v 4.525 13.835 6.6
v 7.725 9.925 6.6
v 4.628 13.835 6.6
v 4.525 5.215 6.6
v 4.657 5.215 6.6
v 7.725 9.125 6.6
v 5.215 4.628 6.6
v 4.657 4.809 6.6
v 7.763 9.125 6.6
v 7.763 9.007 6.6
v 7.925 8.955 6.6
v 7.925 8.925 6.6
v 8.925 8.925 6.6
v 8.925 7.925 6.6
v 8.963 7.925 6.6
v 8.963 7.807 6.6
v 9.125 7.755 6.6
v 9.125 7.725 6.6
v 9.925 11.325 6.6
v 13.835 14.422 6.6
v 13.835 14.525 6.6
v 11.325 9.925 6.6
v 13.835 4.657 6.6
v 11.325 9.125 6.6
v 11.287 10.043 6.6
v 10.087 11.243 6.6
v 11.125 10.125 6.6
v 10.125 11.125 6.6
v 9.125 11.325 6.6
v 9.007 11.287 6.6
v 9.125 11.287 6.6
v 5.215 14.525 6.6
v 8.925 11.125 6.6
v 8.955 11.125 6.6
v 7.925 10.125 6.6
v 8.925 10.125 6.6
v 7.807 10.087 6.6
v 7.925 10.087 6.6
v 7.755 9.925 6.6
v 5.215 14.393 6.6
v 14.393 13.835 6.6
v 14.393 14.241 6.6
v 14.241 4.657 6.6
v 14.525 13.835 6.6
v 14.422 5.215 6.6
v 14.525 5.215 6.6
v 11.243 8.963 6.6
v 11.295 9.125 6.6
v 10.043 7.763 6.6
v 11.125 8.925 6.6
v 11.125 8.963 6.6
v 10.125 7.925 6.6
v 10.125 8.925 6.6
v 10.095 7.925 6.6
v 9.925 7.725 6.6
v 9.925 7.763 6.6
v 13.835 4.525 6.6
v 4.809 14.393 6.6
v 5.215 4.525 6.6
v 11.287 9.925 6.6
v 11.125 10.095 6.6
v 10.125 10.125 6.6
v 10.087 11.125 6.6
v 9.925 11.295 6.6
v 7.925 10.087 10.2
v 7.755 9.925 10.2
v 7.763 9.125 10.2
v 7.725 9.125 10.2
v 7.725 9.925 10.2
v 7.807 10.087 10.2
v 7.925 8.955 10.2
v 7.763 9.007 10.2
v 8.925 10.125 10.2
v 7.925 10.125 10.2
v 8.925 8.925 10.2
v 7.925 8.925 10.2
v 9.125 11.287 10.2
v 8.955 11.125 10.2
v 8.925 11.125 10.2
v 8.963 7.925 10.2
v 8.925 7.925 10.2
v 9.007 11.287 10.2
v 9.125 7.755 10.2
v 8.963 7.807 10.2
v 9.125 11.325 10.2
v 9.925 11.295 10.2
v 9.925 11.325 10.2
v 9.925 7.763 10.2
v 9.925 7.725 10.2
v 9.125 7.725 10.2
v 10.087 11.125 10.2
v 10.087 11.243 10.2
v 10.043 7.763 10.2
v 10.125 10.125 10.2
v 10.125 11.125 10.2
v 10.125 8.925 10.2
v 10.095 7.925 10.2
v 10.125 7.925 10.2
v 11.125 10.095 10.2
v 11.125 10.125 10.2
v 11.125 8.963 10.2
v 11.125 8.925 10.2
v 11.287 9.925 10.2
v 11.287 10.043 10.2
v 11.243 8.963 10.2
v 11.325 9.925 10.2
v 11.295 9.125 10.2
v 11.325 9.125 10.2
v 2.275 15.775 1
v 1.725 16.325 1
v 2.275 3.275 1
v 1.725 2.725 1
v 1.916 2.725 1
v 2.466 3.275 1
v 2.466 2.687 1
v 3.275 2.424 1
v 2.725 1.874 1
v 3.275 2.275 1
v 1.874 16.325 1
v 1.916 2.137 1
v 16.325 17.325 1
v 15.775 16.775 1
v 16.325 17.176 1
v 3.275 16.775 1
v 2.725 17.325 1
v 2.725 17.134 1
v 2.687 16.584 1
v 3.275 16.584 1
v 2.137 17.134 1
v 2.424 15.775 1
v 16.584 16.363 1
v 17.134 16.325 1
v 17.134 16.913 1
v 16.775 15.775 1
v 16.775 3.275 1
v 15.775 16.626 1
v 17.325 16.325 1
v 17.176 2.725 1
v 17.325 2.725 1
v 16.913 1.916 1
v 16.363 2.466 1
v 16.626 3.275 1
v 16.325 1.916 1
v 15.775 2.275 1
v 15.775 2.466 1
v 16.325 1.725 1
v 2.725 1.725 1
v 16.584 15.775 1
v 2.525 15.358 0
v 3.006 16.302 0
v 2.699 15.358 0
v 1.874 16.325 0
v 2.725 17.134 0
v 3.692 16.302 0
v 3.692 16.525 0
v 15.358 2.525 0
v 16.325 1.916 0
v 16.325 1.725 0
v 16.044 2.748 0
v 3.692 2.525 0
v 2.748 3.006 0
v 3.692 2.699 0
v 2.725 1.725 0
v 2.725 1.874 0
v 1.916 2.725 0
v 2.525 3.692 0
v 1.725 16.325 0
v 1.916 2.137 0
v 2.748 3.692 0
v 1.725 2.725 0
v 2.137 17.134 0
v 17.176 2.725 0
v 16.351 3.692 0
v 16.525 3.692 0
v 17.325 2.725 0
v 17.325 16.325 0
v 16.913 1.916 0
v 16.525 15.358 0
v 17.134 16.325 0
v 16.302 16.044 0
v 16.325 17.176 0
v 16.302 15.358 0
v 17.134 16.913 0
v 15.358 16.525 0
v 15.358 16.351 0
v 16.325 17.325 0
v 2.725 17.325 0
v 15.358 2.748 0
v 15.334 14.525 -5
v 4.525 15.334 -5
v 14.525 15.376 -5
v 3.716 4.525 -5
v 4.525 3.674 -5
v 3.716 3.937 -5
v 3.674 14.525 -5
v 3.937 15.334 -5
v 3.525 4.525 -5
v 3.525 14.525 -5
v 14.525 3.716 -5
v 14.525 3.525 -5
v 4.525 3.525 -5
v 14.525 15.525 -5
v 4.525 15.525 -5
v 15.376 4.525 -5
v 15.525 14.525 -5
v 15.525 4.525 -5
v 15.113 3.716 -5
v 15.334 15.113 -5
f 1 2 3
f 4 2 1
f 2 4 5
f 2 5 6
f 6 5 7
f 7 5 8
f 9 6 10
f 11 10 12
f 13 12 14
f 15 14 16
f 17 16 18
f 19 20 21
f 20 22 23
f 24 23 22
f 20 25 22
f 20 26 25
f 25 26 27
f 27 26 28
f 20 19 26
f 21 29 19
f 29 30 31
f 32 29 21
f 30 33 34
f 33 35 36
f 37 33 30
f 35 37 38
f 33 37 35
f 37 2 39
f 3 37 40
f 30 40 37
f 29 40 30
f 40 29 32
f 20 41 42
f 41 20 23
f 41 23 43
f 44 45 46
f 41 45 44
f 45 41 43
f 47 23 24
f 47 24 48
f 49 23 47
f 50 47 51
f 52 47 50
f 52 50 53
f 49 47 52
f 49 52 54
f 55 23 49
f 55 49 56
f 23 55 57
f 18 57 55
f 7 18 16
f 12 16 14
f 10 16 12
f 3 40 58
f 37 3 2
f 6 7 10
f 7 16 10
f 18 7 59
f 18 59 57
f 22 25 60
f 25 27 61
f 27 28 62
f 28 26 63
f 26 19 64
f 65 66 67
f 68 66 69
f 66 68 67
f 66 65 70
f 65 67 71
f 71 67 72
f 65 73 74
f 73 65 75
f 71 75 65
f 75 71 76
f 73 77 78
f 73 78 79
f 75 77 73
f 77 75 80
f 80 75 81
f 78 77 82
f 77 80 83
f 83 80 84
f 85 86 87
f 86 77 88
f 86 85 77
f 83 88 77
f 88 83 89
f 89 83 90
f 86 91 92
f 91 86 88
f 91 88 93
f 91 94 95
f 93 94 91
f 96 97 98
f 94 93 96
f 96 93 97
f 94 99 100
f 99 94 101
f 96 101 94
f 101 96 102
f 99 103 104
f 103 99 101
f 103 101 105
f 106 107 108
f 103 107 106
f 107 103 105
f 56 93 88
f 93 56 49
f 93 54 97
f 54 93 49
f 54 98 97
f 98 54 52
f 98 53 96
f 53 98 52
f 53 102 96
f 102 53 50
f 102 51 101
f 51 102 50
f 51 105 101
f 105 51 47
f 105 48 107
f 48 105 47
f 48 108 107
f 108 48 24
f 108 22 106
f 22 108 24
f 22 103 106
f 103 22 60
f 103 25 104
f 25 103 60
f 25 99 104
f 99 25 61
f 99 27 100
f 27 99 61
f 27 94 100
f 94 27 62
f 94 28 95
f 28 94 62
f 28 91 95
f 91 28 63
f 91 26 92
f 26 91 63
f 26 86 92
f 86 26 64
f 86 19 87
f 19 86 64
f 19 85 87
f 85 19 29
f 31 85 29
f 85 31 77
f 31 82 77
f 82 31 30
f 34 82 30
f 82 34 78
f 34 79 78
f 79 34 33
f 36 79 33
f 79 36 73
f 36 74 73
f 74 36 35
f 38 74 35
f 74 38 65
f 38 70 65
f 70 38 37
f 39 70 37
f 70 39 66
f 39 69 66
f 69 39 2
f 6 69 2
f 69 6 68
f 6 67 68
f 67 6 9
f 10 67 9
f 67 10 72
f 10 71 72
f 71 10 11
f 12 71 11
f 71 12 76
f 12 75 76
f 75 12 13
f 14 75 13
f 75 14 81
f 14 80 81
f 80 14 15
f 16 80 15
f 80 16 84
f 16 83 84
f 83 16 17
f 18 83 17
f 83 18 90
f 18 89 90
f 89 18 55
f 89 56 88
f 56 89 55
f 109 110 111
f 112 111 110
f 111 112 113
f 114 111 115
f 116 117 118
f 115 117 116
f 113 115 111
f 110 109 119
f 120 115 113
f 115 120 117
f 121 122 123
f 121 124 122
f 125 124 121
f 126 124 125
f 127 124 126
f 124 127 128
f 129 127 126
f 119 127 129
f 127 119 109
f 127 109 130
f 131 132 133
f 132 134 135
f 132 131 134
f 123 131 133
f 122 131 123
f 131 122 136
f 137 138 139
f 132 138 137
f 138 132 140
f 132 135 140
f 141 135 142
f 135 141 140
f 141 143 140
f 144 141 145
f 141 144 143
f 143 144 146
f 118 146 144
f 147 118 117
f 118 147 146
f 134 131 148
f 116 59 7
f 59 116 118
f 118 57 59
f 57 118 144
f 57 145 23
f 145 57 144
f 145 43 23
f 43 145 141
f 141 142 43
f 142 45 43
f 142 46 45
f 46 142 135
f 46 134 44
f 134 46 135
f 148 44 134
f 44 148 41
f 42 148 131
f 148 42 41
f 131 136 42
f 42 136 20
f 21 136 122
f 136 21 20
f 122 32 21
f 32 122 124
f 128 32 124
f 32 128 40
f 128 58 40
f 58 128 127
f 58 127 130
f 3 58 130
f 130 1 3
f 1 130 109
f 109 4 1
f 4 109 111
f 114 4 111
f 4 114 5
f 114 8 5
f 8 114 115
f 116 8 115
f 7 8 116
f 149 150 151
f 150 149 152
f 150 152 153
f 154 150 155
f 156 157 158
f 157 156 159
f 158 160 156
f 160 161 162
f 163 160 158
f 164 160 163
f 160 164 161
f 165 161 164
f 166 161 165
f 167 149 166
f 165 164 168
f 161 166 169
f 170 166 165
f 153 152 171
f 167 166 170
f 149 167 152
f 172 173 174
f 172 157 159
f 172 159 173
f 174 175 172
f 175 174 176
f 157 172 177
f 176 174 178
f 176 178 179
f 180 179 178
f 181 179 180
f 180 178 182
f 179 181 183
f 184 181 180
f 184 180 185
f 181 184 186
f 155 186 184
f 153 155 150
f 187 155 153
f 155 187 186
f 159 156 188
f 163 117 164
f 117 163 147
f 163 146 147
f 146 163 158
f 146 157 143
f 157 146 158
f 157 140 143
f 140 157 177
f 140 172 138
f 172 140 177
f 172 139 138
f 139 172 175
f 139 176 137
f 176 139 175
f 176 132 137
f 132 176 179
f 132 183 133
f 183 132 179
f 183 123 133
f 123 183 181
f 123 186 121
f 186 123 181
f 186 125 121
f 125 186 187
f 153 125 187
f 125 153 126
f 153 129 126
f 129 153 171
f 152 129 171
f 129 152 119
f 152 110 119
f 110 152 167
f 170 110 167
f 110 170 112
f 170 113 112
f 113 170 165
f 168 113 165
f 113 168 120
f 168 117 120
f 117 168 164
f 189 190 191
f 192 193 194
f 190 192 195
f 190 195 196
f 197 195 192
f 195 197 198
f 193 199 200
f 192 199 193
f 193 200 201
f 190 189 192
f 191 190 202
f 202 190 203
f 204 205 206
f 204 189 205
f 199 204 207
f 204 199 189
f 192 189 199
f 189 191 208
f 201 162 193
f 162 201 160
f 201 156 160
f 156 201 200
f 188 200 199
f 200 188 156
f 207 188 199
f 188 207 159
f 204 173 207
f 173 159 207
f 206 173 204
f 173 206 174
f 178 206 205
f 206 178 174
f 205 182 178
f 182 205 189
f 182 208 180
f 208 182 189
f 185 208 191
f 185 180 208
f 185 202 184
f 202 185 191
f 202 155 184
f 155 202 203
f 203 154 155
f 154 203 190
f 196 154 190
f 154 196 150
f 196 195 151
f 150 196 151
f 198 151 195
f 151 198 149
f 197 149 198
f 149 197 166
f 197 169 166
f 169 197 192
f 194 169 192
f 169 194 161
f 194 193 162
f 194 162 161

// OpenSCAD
// file: shapes.scad
module squircle(size, radius, center = false){
    
    x = size[0];
    y = size[1];
    radius = min(x/2,min(y/2, radius));
    translation = [0,0];
        
    module corner(){
            intersection(){
                square([radius,radius]);
                translate([radius, radius])
                    circle(radius);
            }
    }
    
    module body(){
    
        corner();
        
        translate([0, y])        
            rotate([0,0,-90])
                corner();
        
        translate([x, y])        
            rotate([0,0,180])
                corner();
        
        translate([x, 0])        
            rotate([0,0, 90])
                corner();
        
        translate([radius, 0])
            square([x - 2 * radius, radius]);
        
        translate([0, radius])
            square([x, y - radius * 2]);
            
        translate([radius, y - radius])
            square([x - 2 * radius, radius]);
    }
    
    if(center)
        translate([-x/2, -y/2])
            body();
    else
        body();
}
// main file
use<shapes.scad>;

// draws a rough Cherry MX style switch at 0,0 1U space
module switch(){
    
    ringWidth = 15.6;
    ringHeight = 1.0;

    bottomTopWidth = 14.0;
    bottomBottomWidth = 12.0;
    bottomHeight = 5.0;

    topBottomWidth = 14.5;
    topTopWidth = 10;
    topHeight = 11.6 - bottomHeight - ringHeight;

    module switch_stem(){

        width = 3.6;
        height = 3.6;
        depth = 1.2;
        edgeRadius = 0.2;

		color("FireBrick",1)
            translate([0,0, ringHeight + topHeight])
                linear_extrude(height = height){
                    squircle([width, depth], edgeRadius, true);
                    rotate([0,0,90])
                        squircle([width, depth], edgeRadius, true);
                }
    }

    module switch_top(){
		color("WhiteSmoke",1)
            translate([0,0,ringHeight])
                linear_extrude(topHeight, scale = topTopWidth / topBottomWidth)
                    translate([-topBottomWidth/2,-topBottomWidth/2,0])
                        squircle([topBottomWidth,topBottomWidth], 1.0);
    }
                    
    module switch_middle(){
		color("WhiteSmoke",1)
            linear_extrude(ringHeight)
                squircle([ringWidth, ringWidth], 1.0, center = true);
    }

    module switch_bottom(){
		color("WhiteSmoke",1)
            translate([0,0,-bottomHeight])
                linear_extrude(bottomHeight, scale = bottomTopWidth / bottomBottomWidth)
                    translate([-bottomBottomWidth/2,-bottomBottomWidth/2,0])
                        squircle([bottomBottomWidth,bottomBottomWidth], 1.0);
    }

    translate([19.05/2,19.05/2,0]){
        switch_stem();
        switch_top();
        switch_middle();
        switch_bottom();
    }
}

switch();
